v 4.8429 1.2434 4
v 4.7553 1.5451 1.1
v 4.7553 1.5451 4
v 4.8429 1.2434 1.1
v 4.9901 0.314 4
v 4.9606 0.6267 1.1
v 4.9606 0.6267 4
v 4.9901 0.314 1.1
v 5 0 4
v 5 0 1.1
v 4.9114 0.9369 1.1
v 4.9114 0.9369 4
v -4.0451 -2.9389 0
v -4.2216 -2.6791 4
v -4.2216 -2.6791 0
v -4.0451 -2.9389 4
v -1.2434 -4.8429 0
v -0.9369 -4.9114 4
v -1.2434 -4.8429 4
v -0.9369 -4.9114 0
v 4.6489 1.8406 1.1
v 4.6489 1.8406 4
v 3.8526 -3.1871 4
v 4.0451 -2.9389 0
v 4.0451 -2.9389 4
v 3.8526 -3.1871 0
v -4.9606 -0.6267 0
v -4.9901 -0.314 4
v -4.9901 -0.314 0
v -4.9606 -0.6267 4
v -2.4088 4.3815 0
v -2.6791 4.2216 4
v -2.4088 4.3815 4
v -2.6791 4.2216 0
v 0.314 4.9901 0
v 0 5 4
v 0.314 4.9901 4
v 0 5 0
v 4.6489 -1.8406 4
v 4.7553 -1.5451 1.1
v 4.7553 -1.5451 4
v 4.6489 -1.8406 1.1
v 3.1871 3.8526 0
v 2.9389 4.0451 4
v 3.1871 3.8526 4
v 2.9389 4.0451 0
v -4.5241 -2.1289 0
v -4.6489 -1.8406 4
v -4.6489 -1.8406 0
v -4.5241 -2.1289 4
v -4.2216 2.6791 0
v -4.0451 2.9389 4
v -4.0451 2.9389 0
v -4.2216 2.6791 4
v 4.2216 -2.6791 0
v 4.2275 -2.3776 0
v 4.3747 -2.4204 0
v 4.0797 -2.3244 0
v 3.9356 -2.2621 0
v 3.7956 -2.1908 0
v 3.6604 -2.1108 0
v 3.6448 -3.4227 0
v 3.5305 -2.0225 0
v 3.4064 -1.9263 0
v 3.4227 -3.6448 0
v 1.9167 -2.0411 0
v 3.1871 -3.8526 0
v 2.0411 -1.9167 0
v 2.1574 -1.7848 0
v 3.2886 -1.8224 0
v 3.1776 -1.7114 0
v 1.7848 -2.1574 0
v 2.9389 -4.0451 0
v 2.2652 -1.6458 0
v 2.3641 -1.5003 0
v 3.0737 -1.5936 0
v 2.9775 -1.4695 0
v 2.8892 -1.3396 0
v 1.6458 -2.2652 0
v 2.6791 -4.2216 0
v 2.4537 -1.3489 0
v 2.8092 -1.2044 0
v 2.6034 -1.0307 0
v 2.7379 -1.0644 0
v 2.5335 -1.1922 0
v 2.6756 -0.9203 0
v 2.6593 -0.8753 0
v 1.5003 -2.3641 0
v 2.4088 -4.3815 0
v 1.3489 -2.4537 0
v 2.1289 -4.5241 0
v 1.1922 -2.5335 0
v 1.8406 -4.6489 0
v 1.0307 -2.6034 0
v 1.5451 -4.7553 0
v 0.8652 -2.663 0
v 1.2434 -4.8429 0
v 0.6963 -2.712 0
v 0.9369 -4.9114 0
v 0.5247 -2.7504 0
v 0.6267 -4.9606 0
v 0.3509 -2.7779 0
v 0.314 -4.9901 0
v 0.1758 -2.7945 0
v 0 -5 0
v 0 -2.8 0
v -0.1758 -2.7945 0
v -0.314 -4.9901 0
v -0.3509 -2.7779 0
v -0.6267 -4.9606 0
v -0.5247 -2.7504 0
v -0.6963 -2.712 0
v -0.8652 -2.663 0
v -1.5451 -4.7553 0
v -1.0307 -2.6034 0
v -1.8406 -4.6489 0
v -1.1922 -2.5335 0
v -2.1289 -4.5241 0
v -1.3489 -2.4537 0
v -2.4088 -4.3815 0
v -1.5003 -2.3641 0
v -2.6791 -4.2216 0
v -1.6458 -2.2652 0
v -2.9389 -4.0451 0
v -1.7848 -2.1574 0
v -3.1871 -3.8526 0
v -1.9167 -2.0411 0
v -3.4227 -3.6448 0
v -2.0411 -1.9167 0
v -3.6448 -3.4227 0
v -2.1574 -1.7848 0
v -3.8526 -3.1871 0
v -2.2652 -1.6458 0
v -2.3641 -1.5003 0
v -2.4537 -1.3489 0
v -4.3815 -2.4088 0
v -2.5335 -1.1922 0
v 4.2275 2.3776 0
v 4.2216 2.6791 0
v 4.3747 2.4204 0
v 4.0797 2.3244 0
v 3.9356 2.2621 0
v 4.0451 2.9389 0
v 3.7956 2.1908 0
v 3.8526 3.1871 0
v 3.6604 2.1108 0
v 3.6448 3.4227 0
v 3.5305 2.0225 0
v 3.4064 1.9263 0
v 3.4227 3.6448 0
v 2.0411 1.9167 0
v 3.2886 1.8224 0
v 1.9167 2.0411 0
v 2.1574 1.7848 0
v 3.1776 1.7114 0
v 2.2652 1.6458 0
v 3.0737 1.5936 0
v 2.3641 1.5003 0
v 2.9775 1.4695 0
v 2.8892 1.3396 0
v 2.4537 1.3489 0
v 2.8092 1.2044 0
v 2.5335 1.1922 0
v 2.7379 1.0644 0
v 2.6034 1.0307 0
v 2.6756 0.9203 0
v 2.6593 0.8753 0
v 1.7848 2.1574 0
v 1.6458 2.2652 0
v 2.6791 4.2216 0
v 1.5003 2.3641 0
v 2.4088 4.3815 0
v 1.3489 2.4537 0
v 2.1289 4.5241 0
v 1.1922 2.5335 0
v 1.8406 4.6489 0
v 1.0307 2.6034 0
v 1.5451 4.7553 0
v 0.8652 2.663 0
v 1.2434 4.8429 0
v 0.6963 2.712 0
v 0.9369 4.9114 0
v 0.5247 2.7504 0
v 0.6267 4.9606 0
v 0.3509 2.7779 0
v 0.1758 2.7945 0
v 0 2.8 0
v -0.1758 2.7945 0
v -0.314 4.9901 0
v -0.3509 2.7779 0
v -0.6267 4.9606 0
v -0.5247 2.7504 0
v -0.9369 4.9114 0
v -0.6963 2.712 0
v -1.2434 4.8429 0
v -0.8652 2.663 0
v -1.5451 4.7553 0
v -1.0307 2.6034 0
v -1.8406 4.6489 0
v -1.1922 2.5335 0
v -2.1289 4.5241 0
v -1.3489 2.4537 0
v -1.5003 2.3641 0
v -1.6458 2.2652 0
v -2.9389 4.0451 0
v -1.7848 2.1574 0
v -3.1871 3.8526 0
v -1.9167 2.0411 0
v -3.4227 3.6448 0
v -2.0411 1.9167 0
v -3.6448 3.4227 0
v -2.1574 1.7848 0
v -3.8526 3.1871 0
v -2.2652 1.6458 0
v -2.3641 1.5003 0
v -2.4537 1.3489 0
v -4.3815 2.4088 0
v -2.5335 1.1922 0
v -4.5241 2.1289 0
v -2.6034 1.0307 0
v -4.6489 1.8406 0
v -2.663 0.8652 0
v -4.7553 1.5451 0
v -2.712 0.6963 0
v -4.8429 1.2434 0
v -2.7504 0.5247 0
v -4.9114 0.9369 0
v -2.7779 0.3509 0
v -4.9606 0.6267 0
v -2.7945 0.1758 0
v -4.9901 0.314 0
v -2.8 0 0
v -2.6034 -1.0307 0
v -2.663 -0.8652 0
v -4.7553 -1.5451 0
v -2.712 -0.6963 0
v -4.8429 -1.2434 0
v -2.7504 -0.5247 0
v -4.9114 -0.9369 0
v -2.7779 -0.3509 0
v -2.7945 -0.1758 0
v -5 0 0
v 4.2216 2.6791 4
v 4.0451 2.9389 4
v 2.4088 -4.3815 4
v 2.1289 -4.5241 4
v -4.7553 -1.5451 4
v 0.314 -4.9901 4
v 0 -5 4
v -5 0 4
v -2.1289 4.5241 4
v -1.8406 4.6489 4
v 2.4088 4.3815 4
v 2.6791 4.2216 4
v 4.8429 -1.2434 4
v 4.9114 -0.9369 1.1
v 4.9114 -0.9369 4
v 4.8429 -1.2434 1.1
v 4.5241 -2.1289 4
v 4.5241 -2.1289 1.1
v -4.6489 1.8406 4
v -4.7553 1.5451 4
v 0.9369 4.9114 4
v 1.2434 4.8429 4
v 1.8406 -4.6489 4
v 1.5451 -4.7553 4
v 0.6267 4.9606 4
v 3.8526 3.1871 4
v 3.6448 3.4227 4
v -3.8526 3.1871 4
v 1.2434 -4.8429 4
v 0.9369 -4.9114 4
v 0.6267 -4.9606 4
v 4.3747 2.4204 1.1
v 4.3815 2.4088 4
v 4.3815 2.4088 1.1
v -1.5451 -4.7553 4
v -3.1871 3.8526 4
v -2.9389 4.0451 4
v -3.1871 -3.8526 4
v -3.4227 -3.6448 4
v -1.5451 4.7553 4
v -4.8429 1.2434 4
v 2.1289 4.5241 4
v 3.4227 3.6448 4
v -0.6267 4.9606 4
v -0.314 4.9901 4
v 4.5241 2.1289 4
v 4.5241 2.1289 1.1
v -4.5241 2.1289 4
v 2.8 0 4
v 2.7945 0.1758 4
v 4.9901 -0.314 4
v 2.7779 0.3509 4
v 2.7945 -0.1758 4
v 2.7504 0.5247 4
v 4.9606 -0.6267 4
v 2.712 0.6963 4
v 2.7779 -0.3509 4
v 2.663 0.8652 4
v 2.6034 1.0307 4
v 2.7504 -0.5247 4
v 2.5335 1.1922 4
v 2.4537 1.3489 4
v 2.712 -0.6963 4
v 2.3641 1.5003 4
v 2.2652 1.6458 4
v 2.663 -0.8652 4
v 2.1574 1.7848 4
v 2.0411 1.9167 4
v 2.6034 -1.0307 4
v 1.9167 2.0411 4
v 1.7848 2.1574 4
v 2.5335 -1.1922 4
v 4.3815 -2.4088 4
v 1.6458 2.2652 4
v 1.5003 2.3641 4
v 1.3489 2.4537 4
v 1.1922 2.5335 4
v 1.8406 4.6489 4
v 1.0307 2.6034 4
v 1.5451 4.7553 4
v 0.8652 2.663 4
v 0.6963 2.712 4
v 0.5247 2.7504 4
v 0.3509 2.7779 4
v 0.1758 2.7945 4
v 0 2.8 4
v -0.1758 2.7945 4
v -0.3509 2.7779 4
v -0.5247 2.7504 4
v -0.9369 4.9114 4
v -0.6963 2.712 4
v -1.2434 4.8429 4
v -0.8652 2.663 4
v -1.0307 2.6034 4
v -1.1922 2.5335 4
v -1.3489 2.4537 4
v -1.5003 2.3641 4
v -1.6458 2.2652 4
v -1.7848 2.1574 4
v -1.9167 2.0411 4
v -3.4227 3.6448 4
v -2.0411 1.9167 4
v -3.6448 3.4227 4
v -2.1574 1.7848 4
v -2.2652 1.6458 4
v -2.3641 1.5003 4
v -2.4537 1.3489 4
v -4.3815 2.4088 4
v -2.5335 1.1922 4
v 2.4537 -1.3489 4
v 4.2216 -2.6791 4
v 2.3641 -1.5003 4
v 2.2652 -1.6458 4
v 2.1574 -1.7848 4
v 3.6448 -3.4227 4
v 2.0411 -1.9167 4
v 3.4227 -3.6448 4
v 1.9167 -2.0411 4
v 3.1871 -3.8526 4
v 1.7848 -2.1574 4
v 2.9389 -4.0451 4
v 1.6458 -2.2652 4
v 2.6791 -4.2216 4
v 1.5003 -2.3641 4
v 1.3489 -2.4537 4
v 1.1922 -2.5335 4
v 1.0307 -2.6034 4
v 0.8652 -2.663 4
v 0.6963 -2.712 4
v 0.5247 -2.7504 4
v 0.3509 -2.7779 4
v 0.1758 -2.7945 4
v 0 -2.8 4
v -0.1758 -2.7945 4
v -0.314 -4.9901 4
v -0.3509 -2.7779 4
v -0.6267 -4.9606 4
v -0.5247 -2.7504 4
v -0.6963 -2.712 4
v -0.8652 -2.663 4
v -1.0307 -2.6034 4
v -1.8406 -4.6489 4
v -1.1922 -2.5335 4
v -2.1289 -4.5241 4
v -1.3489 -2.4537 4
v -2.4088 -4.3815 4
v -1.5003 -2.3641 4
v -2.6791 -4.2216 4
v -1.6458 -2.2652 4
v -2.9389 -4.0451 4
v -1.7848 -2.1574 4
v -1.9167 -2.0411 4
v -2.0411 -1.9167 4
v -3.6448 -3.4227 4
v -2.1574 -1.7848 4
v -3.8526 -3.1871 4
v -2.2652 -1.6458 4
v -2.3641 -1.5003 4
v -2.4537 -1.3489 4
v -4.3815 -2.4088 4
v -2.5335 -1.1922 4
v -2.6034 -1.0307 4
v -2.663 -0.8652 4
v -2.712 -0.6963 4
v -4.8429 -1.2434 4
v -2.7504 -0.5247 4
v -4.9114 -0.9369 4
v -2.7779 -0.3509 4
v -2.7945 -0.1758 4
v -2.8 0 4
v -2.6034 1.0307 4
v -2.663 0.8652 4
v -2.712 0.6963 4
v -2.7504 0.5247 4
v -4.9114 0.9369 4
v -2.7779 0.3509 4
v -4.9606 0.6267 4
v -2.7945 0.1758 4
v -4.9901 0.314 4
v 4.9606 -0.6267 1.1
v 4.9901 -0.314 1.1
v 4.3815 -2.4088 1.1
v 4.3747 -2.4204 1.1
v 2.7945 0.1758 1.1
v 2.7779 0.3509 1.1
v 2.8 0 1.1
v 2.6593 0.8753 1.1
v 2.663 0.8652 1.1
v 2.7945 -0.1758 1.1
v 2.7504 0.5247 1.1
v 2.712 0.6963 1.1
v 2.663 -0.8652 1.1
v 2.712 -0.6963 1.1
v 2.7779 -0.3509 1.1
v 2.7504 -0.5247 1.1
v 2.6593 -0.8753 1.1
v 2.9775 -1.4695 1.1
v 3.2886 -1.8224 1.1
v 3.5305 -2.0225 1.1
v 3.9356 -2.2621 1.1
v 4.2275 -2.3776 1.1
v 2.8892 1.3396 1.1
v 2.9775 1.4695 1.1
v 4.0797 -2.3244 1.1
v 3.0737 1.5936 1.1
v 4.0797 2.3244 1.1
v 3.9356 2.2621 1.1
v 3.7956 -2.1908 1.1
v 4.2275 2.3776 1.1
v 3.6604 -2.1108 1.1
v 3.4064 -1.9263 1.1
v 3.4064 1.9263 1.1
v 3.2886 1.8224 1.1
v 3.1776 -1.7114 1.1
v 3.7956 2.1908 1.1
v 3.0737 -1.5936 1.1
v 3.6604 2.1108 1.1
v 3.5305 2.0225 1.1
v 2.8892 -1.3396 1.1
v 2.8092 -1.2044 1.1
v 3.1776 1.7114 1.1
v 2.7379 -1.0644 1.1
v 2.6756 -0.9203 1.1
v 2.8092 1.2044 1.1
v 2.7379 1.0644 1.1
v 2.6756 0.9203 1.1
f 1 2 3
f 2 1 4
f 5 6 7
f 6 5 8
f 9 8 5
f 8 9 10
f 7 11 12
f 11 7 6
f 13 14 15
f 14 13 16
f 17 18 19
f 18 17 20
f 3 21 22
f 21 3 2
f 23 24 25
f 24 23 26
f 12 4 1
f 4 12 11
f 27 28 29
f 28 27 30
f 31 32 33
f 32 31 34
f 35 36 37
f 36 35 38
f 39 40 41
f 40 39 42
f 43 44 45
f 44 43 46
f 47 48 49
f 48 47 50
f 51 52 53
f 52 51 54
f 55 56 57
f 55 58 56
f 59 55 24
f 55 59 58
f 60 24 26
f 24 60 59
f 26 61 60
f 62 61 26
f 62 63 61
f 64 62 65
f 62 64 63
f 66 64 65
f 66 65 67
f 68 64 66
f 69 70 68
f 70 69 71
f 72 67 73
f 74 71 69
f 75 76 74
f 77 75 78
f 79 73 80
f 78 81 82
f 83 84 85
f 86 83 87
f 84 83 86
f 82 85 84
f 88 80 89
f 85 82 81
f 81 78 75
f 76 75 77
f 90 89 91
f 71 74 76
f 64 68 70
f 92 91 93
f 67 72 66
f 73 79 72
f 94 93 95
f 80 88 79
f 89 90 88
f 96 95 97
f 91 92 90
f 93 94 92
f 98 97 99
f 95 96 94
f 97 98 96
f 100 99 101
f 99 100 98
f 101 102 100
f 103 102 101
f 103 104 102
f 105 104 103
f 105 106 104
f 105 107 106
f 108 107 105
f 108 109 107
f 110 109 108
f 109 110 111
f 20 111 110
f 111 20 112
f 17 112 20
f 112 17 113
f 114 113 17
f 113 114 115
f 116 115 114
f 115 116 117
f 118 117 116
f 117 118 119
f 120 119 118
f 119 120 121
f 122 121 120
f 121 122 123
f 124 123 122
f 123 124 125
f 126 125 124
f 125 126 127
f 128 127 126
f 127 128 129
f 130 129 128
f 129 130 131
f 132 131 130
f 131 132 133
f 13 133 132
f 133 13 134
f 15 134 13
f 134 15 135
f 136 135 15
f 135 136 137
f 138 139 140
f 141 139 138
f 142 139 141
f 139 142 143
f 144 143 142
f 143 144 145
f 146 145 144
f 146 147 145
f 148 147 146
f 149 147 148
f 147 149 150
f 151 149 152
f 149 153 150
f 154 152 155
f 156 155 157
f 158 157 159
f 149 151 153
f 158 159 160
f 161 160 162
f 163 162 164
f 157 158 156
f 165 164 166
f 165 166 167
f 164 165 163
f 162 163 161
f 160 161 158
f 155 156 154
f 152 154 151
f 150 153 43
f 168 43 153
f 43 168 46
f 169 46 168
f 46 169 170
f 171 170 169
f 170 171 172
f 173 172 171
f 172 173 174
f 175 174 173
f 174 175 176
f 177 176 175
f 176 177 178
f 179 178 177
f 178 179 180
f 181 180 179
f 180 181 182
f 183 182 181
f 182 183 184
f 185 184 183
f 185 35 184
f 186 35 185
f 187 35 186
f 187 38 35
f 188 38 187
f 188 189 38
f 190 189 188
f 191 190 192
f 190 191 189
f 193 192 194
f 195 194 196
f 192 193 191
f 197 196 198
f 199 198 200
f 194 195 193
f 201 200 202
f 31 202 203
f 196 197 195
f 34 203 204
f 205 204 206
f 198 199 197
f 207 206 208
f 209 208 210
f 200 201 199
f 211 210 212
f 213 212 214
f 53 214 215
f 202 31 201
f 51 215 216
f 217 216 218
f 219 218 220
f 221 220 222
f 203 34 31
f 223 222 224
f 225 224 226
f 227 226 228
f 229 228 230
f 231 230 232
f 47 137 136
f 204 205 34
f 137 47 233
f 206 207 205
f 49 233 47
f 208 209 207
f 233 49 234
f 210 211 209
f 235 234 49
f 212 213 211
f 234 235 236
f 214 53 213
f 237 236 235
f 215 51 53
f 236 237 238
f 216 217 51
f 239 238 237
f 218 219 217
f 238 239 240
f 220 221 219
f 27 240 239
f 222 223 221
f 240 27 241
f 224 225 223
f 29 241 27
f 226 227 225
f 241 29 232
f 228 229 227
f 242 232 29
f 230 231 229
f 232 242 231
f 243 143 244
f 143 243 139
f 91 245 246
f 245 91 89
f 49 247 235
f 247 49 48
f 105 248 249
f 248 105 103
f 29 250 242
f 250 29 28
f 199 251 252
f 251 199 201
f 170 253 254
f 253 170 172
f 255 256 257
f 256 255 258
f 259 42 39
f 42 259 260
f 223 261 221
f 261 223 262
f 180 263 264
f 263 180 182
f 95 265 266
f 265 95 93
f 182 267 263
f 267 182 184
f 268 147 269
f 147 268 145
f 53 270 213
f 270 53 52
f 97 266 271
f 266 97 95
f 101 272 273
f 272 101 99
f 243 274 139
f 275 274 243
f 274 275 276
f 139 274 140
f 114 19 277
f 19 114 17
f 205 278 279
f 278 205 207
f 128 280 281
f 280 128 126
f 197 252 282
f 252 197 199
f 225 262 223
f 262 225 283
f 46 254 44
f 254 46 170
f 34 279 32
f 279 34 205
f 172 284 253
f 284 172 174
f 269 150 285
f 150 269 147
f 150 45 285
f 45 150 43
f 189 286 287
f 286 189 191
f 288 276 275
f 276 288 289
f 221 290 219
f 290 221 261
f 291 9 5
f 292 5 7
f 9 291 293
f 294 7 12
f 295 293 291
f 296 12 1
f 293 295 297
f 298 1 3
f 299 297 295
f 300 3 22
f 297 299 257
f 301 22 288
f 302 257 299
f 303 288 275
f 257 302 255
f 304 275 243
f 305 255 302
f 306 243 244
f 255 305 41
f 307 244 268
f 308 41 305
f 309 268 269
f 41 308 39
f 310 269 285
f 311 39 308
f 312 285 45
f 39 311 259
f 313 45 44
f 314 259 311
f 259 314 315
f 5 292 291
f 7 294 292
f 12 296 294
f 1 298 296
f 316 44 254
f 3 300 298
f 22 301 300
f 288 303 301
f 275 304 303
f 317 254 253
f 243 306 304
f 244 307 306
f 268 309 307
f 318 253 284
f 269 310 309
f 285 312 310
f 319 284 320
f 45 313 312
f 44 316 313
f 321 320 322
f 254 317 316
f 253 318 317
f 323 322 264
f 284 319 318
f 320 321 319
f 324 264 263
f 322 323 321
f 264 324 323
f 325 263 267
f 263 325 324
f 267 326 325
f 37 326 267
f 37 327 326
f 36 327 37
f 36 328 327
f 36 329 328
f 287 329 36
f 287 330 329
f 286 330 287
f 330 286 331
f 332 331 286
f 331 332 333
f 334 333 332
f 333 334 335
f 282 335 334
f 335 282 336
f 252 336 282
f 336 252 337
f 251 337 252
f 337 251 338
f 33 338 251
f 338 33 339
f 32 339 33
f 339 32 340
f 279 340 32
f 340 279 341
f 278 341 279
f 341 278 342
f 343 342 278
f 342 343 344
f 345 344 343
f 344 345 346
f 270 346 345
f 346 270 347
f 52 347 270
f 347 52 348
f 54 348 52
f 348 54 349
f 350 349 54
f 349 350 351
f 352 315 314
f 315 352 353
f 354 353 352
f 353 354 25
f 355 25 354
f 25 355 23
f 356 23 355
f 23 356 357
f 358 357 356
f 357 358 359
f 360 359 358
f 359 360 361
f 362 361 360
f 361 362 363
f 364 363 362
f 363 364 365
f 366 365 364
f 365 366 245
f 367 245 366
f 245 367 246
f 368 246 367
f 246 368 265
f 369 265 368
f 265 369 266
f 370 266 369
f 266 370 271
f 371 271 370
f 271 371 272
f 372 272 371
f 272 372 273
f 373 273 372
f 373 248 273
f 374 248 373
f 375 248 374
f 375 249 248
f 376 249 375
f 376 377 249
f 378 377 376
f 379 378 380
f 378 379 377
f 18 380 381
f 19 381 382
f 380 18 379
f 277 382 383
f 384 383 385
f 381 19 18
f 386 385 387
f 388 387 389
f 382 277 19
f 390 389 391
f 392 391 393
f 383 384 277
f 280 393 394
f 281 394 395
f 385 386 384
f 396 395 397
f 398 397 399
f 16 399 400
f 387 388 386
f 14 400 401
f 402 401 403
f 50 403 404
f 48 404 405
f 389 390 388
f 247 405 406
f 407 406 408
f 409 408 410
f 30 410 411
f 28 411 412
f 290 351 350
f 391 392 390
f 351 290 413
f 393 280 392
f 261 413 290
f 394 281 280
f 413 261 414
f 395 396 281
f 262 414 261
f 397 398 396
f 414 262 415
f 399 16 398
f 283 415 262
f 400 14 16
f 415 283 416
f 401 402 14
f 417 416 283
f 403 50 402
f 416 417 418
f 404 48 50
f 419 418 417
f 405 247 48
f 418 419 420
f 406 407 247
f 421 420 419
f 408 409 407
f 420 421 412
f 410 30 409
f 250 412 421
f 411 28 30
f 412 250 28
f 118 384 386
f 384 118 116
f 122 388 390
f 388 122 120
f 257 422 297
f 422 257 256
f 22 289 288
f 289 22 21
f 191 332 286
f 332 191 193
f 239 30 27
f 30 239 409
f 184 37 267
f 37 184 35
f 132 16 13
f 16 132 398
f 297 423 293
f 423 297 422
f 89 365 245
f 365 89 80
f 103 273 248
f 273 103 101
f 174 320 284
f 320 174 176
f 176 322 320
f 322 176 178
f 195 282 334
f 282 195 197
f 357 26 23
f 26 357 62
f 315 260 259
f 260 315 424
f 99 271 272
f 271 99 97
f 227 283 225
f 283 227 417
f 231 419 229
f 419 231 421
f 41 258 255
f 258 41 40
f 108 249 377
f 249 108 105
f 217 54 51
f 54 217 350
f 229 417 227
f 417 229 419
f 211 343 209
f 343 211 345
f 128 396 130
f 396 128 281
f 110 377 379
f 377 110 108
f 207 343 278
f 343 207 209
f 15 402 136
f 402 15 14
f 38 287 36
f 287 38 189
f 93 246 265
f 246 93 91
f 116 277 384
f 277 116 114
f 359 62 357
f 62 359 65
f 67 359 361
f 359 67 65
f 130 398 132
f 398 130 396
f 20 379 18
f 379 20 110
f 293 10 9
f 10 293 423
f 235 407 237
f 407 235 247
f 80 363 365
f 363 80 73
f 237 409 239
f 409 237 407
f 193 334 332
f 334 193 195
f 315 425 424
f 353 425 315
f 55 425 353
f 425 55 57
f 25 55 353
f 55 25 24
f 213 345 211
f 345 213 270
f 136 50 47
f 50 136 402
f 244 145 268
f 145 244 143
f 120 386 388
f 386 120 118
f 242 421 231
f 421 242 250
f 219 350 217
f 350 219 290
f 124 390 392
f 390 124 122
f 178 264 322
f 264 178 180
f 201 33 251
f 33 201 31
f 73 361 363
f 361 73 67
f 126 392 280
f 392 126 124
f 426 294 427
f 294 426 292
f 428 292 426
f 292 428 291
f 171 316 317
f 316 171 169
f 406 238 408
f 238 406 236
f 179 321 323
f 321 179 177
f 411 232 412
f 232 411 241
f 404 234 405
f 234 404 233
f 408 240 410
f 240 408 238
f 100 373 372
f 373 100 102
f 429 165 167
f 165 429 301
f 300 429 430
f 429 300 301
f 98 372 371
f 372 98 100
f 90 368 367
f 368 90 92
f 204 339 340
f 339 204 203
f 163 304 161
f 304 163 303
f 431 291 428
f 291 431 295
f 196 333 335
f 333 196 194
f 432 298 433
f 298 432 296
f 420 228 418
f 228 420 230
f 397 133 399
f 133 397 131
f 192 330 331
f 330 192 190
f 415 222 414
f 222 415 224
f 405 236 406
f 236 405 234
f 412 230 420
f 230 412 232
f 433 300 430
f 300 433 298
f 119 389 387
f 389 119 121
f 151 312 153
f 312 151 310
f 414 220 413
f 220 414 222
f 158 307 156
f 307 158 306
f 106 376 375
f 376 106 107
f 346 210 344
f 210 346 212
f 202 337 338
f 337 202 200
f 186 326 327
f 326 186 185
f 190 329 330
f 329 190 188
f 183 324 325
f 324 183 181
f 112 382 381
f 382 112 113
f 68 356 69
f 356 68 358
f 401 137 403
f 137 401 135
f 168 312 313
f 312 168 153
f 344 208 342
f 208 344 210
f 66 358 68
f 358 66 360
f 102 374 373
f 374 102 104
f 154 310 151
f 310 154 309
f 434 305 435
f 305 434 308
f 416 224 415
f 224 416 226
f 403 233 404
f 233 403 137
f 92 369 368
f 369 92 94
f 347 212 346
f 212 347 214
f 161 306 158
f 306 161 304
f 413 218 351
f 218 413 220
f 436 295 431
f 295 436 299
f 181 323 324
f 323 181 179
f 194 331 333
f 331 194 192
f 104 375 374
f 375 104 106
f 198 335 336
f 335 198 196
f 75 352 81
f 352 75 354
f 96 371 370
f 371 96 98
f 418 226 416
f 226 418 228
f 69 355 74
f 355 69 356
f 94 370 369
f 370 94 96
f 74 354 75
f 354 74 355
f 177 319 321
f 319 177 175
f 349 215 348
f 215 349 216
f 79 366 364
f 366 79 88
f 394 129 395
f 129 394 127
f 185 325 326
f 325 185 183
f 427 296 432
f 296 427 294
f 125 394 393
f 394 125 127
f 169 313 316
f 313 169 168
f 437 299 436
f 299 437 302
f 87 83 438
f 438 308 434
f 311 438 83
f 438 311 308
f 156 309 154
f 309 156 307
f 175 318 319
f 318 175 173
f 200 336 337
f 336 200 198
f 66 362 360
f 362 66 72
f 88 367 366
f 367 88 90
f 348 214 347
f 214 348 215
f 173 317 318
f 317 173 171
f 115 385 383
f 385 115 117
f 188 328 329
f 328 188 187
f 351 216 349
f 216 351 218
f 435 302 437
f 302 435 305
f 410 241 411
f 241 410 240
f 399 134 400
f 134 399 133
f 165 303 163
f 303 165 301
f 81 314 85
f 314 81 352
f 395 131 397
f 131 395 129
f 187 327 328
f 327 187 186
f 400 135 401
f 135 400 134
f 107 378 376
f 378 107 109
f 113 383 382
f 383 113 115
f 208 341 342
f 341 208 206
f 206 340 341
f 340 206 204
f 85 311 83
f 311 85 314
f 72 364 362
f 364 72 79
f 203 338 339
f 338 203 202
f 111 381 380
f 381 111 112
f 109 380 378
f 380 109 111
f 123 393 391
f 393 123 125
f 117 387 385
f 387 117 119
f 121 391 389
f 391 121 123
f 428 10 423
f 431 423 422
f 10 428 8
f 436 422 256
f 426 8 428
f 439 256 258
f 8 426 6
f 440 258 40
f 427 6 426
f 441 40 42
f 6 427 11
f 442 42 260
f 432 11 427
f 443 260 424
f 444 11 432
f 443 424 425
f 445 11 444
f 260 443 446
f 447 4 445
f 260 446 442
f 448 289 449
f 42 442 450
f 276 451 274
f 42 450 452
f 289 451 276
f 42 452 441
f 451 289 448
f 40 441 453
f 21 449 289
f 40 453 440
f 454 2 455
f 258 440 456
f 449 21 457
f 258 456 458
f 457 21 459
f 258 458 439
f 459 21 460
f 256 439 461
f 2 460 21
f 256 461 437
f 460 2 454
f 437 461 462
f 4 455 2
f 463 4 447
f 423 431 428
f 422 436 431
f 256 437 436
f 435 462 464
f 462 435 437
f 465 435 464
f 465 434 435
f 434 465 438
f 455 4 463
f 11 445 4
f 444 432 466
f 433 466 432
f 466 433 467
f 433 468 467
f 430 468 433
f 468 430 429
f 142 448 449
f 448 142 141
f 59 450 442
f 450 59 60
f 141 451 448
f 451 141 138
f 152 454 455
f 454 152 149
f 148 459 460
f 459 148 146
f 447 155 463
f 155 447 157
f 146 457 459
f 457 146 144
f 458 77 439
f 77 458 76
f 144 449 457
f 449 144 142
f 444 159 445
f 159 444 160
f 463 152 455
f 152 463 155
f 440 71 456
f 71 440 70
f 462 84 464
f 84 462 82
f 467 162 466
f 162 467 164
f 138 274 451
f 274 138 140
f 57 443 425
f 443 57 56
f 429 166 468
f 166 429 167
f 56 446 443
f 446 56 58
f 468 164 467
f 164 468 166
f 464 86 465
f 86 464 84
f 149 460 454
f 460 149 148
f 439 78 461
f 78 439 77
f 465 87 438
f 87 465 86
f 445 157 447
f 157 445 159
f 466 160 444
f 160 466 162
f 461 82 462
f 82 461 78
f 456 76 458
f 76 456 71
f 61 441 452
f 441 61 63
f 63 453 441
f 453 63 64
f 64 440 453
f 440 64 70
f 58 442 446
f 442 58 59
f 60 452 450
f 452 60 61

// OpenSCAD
$fn = 100;

difference() {
     cylinder(4, 10/2, 10/2);
     cylinder(4, 5.6/2, 5.6/2);
     translate([5, 0, 0])
          cylinder(1.1, 5/2, 5/2);
}
